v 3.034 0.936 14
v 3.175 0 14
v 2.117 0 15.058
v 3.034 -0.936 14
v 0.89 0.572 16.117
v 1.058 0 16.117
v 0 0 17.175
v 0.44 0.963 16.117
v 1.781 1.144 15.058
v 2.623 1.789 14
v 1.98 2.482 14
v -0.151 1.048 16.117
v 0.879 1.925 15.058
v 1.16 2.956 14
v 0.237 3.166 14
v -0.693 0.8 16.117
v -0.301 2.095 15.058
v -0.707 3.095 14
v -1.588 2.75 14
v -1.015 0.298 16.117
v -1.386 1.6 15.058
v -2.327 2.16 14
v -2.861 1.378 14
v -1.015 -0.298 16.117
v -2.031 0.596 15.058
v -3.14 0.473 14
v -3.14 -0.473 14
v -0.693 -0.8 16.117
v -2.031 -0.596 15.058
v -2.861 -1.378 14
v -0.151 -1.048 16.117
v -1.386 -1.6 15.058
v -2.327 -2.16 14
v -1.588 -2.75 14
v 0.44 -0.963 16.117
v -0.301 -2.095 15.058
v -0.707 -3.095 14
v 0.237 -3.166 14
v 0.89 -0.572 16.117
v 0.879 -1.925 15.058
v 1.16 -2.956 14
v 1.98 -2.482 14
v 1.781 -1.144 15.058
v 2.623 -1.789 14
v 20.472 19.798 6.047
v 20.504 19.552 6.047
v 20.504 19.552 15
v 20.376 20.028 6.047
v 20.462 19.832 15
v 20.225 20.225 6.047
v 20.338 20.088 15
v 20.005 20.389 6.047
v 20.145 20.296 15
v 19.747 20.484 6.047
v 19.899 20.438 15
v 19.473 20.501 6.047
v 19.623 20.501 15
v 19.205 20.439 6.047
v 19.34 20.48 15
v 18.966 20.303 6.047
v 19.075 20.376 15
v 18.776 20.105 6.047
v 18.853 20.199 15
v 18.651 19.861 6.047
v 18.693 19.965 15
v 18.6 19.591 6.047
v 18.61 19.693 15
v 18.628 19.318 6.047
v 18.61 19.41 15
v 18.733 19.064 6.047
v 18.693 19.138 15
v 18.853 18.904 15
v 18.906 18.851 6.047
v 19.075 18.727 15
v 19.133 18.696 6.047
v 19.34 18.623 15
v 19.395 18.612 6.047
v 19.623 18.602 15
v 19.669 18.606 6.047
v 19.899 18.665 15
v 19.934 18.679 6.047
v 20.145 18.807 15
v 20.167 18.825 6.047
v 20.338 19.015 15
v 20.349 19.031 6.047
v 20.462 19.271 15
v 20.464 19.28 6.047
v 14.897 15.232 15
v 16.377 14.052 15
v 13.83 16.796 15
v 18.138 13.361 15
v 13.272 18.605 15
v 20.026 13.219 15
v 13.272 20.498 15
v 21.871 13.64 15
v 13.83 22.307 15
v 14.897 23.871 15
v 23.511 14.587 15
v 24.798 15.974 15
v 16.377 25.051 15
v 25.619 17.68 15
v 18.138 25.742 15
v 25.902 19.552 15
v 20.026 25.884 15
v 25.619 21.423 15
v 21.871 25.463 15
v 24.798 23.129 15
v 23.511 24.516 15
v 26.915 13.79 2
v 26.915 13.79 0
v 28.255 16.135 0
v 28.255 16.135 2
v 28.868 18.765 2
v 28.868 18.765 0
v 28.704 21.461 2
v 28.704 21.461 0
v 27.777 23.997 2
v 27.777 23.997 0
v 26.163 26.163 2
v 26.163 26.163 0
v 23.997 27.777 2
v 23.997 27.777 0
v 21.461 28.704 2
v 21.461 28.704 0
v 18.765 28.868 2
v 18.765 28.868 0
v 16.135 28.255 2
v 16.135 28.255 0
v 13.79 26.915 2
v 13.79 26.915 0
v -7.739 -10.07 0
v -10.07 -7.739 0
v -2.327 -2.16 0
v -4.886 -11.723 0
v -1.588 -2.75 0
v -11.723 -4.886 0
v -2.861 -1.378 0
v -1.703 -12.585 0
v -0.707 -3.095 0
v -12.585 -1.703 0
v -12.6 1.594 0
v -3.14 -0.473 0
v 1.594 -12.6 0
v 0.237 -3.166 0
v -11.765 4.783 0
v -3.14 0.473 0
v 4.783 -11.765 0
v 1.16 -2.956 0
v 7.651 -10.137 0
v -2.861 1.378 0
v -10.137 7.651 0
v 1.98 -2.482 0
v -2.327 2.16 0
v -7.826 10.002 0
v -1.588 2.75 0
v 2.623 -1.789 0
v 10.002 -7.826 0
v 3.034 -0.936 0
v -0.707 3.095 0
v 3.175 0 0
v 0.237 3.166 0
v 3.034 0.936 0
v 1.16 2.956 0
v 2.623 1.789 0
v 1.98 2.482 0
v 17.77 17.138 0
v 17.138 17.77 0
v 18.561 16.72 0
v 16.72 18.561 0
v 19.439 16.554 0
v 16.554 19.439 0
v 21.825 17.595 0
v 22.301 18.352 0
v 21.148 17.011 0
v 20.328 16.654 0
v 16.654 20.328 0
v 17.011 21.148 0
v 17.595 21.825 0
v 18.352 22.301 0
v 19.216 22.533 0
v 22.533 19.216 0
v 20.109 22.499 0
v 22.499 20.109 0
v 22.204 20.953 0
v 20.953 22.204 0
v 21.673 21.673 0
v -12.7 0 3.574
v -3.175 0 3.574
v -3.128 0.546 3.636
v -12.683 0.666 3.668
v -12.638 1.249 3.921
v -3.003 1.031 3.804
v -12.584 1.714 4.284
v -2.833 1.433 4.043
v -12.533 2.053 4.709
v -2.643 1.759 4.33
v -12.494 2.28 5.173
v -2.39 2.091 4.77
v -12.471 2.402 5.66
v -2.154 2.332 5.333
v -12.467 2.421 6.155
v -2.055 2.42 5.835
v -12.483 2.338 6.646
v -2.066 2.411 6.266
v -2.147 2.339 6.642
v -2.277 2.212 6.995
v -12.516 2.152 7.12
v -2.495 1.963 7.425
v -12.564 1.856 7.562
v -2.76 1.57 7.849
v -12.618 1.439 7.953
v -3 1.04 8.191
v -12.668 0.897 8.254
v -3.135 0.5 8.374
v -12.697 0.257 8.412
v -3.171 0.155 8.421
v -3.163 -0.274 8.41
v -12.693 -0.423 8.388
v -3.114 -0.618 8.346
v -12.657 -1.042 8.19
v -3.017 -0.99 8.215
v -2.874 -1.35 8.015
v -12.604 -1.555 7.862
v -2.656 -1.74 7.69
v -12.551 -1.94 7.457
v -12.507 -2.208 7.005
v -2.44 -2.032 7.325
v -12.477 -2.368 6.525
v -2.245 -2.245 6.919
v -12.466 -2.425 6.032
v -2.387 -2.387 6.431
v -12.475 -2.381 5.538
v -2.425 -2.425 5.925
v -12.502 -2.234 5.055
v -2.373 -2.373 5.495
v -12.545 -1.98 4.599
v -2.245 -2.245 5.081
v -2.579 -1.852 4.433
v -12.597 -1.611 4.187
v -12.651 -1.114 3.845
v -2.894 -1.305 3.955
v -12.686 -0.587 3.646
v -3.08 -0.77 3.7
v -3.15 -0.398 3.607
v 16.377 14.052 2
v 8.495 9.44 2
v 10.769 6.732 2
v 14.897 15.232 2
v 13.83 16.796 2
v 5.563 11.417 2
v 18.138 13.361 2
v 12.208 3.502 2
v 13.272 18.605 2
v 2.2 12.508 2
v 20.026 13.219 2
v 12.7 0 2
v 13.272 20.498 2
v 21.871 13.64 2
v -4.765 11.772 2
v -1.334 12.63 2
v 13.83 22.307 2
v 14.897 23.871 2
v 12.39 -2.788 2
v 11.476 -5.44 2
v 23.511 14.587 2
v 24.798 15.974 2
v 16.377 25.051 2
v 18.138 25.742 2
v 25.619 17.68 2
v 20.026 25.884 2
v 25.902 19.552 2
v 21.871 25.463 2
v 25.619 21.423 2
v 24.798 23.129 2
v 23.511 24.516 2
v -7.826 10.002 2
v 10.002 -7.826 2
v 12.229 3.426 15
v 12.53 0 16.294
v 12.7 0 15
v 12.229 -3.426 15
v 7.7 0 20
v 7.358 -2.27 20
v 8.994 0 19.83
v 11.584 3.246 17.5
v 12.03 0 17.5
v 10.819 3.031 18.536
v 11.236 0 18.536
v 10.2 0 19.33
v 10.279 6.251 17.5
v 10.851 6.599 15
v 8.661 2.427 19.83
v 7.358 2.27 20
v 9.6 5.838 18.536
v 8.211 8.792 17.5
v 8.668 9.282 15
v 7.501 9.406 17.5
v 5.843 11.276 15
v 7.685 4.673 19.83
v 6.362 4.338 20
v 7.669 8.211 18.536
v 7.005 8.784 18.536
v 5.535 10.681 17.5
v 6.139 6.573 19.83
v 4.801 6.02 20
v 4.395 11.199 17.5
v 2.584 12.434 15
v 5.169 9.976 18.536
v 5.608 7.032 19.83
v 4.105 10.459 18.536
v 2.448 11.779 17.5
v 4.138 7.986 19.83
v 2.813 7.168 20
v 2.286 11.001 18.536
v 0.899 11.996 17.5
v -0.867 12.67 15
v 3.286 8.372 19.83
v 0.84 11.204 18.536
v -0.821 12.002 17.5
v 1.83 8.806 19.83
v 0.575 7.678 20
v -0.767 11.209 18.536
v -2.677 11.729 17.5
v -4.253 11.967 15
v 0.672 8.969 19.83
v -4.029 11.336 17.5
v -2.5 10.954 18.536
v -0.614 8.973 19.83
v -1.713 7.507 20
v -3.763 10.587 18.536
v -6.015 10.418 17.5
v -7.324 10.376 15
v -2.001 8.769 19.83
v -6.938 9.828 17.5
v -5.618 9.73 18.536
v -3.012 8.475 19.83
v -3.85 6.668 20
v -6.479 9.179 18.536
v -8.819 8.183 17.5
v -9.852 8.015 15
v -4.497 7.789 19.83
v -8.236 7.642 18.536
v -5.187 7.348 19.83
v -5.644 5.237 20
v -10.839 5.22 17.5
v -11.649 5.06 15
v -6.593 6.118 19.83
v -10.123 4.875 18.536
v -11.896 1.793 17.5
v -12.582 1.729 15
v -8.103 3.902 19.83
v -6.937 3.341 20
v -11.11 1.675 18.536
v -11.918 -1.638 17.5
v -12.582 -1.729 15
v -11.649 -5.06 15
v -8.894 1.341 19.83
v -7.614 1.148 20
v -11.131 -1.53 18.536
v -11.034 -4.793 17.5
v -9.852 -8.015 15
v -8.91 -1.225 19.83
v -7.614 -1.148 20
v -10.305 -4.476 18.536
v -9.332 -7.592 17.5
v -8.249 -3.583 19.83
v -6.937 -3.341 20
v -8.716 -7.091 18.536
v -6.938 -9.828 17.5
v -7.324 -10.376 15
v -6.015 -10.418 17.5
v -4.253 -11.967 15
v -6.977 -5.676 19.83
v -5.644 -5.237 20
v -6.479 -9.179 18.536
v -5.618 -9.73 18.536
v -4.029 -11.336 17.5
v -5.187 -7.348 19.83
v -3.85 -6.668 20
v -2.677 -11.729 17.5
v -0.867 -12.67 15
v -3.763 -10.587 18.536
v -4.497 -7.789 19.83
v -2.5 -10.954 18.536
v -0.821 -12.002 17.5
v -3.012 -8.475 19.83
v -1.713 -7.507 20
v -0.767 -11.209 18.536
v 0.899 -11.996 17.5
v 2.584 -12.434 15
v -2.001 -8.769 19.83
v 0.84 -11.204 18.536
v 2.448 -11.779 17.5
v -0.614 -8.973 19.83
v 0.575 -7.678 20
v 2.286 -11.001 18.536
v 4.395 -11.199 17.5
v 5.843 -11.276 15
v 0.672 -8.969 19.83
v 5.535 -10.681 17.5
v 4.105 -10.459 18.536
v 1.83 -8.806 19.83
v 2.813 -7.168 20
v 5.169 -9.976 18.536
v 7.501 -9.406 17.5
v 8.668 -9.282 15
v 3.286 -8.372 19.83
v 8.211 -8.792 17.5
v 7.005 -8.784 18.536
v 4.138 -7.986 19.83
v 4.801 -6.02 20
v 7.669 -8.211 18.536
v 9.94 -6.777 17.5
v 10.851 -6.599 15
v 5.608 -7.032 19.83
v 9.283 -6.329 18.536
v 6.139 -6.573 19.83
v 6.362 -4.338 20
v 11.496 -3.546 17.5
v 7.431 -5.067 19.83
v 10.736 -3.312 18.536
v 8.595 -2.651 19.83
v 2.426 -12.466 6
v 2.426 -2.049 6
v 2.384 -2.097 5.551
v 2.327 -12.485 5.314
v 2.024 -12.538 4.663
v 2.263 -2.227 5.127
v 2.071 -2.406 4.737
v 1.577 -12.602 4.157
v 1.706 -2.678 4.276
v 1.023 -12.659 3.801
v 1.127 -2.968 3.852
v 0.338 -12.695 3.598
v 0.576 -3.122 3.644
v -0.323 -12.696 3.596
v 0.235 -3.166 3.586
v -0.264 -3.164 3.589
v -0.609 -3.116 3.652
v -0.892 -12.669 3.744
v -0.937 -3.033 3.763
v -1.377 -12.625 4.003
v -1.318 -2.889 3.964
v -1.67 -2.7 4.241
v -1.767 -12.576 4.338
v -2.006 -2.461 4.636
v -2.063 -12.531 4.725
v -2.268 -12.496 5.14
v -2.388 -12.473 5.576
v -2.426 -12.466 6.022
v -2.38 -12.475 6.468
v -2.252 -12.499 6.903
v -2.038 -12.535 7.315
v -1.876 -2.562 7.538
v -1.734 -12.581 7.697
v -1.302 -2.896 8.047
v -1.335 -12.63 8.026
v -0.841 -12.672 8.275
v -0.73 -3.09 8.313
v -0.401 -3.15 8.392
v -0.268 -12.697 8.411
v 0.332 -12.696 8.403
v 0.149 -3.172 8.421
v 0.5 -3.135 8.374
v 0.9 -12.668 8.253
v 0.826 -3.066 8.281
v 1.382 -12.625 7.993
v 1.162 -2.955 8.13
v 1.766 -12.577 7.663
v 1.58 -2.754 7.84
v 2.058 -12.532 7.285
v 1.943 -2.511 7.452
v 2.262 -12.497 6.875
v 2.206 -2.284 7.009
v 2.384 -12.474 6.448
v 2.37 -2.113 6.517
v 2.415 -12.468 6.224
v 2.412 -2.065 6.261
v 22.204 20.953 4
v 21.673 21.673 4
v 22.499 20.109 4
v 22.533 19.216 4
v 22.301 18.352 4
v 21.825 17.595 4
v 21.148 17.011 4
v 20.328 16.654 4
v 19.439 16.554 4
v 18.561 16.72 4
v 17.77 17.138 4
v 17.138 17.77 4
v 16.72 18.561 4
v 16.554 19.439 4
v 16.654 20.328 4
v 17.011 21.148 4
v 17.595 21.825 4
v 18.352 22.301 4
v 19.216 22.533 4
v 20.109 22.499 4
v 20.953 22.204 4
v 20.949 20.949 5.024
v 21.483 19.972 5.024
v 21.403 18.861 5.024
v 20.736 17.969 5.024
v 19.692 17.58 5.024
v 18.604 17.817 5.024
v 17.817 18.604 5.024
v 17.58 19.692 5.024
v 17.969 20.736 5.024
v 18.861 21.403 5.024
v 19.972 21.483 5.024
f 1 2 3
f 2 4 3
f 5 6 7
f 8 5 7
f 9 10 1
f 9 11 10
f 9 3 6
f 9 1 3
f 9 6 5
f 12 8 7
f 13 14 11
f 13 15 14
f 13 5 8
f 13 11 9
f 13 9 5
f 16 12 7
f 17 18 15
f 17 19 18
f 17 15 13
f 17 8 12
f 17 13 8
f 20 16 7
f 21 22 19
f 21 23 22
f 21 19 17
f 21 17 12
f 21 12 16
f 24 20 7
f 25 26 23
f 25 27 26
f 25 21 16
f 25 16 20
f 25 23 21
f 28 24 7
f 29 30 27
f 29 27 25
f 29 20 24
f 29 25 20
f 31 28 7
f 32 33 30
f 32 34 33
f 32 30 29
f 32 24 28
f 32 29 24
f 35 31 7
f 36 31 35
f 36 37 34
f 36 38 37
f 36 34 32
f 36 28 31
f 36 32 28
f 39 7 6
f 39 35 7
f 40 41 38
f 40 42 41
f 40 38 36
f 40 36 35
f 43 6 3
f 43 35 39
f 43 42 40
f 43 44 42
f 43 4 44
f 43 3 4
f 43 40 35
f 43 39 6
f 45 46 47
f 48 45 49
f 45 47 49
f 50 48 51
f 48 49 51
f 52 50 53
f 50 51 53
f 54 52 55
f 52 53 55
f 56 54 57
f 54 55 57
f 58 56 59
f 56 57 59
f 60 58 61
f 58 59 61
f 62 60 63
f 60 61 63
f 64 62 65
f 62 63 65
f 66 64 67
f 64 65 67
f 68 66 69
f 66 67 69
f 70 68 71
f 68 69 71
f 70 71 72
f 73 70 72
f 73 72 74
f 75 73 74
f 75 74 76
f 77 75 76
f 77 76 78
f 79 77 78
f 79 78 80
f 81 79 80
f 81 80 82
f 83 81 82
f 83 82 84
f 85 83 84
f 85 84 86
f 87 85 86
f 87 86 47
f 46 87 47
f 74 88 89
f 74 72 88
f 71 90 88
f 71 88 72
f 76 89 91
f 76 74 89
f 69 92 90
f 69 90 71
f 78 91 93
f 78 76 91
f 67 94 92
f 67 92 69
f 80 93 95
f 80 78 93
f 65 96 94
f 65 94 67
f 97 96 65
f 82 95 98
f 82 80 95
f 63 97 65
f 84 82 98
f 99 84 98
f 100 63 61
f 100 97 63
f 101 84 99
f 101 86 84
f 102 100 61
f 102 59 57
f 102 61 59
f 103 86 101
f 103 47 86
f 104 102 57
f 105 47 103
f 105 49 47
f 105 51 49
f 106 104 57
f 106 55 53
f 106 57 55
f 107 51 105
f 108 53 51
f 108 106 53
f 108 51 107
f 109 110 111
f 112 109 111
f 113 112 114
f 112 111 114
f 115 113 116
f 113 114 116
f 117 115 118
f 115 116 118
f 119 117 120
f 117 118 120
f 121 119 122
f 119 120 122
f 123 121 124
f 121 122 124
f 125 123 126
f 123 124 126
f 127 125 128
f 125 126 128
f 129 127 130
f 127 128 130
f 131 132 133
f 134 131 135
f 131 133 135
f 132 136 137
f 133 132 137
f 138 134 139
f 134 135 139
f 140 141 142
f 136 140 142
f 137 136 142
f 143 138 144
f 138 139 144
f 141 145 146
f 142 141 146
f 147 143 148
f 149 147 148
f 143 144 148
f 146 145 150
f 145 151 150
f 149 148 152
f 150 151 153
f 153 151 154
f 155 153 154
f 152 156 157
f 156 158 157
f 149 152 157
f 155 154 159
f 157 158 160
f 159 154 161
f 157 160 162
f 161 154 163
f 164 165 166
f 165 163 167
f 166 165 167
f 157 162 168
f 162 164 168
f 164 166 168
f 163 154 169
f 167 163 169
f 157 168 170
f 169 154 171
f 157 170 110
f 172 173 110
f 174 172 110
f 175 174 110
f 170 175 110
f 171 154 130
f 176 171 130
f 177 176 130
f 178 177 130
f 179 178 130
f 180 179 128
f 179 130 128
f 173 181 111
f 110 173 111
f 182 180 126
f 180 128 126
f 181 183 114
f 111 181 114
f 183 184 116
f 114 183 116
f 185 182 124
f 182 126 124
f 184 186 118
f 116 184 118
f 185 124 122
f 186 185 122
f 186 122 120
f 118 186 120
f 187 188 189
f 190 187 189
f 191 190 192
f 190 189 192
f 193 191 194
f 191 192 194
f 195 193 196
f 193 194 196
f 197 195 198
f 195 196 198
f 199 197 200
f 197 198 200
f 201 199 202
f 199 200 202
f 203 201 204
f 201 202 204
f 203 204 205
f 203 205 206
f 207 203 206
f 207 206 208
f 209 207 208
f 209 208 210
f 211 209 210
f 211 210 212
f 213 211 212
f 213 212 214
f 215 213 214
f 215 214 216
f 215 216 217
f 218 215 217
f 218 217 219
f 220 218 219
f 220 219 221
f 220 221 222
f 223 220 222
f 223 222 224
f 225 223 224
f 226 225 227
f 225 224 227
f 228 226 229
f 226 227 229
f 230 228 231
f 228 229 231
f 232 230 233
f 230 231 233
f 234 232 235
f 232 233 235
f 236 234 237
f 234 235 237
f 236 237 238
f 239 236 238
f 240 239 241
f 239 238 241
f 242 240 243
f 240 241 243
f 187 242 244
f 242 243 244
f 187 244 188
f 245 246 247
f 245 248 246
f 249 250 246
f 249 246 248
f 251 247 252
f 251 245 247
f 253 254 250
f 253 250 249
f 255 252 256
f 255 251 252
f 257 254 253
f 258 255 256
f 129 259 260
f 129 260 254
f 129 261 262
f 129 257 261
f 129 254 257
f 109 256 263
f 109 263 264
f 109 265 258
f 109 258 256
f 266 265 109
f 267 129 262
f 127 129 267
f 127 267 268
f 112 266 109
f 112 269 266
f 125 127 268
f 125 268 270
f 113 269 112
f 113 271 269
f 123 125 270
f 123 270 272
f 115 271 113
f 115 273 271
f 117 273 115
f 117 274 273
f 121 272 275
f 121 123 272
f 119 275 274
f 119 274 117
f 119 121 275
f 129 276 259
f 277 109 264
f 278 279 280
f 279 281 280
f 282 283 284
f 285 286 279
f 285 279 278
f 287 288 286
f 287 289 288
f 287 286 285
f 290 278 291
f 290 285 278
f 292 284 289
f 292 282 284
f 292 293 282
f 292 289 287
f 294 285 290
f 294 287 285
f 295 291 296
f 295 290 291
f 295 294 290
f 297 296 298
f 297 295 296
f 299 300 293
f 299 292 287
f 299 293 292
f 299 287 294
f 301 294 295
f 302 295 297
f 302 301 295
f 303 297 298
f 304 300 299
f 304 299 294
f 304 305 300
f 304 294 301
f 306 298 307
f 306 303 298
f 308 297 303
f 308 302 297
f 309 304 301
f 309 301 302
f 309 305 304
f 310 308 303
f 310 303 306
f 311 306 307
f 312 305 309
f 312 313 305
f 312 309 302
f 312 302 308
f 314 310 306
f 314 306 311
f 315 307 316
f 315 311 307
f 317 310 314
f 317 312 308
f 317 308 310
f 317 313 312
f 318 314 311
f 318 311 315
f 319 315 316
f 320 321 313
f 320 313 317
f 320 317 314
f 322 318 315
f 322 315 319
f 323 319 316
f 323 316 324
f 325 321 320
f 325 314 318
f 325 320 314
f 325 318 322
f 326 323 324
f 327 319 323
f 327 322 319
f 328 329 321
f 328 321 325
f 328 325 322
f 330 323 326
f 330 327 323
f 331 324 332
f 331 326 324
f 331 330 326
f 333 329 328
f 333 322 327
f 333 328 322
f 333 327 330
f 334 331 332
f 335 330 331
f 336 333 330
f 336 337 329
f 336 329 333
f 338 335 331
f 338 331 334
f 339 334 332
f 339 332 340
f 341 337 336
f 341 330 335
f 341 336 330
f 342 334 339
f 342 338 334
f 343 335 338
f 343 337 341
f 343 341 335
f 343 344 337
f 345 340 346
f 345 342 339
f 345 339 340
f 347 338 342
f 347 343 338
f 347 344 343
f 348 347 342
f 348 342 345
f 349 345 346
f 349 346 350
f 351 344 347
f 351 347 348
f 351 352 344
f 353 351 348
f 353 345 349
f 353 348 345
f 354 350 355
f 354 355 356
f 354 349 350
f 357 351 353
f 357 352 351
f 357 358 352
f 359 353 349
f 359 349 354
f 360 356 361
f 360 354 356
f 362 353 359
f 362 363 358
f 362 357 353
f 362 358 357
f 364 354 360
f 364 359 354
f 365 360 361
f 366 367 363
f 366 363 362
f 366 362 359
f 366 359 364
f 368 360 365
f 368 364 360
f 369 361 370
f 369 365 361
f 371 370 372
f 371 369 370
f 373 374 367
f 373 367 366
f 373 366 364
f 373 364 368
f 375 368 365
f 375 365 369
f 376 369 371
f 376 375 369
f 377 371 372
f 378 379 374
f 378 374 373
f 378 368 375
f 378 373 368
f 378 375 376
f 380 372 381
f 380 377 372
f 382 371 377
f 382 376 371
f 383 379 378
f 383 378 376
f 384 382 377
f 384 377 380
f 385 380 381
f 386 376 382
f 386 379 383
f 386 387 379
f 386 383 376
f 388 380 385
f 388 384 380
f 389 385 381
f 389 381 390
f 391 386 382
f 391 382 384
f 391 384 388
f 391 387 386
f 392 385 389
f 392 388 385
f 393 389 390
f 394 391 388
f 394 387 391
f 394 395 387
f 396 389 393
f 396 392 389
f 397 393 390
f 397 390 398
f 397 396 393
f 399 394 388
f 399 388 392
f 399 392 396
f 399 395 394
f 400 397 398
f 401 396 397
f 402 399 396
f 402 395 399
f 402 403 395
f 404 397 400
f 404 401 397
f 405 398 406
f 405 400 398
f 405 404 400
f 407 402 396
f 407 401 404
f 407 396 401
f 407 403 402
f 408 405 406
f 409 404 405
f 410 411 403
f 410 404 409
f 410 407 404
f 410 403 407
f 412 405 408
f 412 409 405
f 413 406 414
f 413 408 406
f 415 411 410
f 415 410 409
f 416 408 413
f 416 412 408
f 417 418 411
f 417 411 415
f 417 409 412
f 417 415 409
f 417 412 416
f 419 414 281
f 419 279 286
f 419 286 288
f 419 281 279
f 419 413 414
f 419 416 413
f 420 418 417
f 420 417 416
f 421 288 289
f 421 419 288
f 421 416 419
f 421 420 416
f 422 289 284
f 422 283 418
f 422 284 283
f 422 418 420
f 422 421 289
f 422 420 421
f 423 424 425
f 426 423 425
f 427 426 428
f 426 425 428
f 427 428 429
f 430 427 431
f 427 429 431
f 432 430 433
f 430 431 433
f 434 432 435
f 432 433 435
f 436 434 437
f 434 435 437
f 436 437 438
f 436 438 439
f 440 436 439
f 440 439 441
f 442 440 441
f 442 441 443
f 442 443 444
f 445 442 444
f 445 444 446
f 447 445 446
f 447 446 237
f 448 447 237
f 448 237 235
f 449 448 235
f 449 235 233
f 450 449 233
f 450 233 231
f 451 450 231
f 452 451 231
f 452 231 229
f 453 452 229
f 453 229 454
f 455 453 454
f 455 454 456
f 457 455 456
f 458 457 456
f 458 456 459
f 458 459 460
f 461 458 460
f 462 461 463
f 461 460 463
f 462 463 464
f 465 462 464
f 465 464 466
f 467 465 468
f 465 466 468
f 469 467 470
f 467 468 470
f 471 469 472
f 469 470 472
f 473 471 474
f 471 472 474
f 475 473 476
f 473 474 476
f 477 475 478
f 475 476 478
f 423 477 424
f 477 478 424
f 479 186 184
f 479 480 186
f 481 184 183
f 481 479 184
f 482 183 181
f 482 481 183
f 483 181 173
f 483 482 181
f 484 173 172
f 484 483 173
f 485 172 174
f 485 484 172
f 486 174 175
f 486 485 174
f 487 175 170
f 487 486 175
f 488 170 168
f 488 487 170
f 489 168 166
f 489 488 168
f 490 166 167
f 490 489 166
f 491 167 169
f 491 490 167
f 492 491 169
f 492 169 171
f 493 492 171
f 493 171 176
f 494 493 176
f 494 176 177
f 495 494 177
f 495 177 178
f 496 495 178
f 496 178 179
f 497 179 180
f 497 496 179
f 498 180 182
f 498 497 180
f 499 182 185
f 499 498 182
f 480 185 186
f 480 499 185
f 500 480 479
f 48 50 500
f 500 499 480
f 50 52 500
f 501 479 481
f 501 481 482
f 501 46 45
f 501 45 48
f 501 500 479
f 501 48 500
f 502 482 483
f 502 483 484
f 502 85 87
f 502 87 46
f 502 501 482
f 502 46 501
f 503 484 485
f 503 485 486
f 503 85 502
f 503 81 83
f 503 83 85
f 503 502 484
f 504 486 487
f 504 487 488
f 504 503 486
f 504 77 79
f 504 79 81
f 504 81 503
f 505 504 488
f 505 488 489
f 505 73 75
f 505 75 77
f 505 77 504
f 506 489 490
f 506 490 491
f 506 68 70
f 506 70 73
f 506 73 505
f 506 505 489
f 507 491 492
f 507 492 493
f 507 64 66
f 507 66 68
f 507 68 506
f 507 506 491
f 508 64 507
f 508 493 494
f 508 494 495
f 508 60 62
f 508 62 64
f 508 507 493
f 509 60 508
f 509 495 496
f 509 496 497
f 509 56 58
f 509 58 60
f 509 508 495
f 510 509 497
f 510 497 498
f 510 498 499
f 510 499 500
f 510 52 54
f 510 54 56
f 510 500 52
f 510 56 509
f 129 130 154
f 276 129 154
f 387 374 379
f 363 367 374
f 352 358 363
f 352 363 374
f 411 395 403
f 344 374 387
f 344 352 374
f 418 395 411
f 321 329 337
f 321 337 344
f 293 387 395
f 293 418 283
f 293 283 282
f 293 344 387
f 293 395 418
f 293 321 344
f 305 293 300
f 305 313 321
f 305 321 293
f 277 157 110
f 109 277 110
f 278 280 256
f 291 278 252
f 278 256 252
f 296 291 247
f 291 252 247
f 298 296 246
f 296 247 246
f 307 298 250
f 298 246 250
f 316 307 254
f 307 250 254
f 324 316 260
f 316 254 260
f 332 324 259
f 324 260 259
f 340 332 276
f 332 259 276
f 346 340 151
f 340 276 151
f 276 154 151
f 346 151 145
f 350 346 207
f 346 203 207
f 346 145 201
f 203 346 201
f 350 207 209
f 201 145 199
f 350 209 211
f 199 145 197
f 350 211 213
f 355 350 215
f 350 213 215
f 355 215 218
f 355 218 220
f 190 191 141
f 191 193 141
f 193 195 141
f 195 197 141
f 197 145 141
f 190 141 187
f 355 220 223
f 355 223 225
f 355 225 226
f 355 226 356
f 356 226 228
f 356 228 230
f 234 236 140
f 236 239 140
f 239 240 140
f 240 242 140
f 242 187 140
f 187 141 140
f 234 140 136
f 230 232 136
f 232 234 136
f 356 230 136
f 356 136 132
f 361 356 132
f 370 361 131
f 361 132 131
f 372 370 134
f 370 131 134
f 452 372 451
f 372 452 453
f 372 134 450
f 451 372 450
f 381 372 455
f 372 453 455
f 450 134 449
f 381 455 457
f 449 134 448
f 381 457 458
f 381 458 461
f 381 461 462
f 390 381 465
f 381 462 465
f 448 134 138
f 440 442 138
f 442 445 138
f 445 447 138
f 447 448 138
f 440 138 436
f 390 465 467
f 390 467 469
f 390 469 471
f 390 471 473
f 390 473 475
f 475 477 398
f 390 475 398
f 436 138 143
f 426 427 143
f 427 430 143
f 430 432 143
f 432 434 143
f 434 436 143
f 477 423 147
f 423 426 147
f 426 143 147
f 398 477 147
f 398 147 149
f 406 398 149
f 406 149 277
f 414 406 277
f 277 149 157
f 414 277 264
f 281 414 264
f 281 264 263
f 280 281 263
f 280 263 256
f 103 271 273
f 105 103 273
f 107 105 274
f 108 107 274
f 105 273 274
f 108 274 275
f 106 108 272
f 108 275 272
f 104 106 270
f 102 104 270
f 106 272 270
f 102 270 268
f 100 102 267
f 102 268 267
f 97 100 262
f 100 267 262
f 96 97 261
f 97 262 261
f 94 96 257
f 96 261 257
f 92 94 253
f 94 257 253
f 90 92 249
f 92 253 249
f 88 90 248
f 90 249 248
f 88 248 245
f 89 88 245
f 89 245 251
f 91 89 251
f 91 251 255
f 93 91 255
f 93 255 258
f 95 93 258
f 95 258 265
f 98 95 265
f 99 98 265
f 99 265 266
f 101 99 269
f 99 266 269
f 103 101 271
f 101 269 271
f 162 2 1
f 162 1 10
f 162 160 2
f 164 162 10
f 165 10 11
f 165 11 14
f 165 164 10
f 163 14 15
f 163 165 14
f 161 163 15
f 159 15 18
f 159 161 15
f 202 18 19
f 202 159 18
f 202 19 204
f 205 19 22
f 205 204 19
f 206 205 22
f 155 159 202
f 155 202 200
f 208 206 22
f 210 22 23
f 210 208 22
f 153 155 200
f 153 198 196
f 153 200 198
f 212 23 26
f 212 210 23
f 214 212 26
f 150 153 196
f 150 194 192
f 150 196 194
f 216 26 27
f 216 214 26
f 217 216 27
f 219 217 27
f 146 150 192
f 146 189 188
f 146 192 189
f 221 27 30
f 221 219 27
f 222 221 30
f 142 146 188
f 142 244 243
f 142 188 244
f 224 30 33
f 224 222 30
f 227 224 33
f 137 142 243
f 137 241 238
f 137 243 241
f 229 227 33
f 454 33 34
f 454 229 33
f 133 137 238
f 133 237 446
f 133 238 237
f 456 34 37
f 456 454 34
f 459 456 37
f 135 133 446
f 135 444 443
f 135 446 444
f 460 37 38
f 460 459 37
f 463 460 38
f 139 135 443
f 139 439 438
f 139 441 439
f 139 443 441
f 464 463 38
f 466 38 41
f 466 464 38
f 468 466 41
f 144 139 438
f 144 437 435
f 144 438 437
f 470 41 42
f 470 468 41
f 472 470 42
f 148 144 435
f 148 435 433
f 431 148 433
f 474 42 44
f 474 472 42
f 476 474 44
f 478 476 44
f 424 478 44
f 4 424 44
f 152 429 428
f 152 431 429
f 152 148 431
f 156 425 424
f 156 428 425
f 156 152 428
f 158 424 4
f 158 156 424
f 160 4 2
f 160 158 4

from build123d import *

# Parameters (mm, degrees)
SKETCH1_R           = 12.7
BOSS_EXTRUDE1_DEPTH = 20
FILLET1_R           = 5
CUT_EXTRUDE1_REACH  = 14.7
SKETCH3_R           = 2.4257
CUT_EXTRUDE2_REACH  = 14.7
SKETCH4_R           = 2.4257
BOSS_EXTRUDE2_DEPTH = 2
SKETCH6_R           = 6.35
BOSS_EXTRUDE3_DEPTH = 13
SKETCH8_R           = 0.9525
CUT_EXTRUDE3_DEPTH  = 16.0000001


with BuildPart() as part:
    # Sketch1 → Boss-Extrude1 (new body)
    with BuildSketch(Plane.XY):
        Circle(SKETCH1_R)
    extrude(amount=BOSS_EXTRUDE1_DEPTH)

    # Sketch2 → Cut-Revolve1 (revolve, cut)
    with BuildSketch(Plane(origin=(0, 0, 0), x_dir=(1, 0, 0), z_dir=(0, 1, 0))):
        Polygon((0, 0), (0, -17.175), (3.175, -14), (3.175, 0), align=None)
    revolve(axis=Axis((0, 0, -1), (0, 0, 1)), mode=Mode.SUBTRACT)

    # Fillet1
    fillet1_edges = [part.edges().sort_by_distance(p)[0] for p in [
        (-12.7, 0, 20),
    ]]
    fillet(fillet1_edges, radius=FILLET1_R)

    # Sketch3 → Cut-Extrude1 (cut, up to next)
    with BuildSketch(Plane(origin=(0, 0, 0), x_dir=(1, 0, 0), z_dir=(0, 1, 0)), mode=Mode.PRIVATE) as cut_extrude1_sk1:
        with Locations((0, -6)):
            Circle(SKETCH3_R)
    cut_extrude1_tool1 = extrude(cut_extrude1_sk1.sketch, amount=-CUT_EXTRUDE1_REACH, mode=Mode.PRIVATE) & part.part
    add(cut_extrude1_tool1.solids().sort_by_distance((0, 0, 6))[0], mode=Mode.SUBTRACT)

    # Sketch4 → Cut-Extrude2 (cut, up to next)
    with BuildSketch(Plane(origin=(0, 0, 0), x_dir=(0, 0, -1), z_dir=(1, 0, 0)), mode=Mode.PRIVATE) as cut_extrude2_sk1:
        with Locations((-6, 0)):
            Circle(SKETCH4_R)
    cut_extrude2_tool1 = extrude(cut_extrude2_sk1.sketch, amount=-CUT_EXTRUDE2_REACH, mode=Mode.PRIVATE) & part.part
    add(cut_extrude2_tool1.solids().sort_by_distance((0, 0, 6))[0], mode=Mode.SUBTRACT)

    # Sketch5 → Boss-Extrude2 (add)
    with BuildSketch(Plane.XY):
        with BuildLine():
            Line((13.789783932, 26.915271857), (-7.826077627, 10.002125223))
            ThreePointArc((-7.826077627, 10.002125223), (8.980256121, 8.980256121), (10.002125223, -7.826077627))
            Line((10.002125223, -7.826077627), (26.915271857, 13.789783932))
            ThreePointArc((26.915271857, 13.789783932), (26.162950904, 26.162950904), (13.789783932, 26.915271857))
        make_face()
    extrude(amount=BOSS_EXTRUDE2_DEPTH)

    # Sketch6 → Boss-Extrude3 (add)
    with BuildSketch(Plane.XY.offset(2)):
        with Locations((19.5515025, 19.5515025)):
            Circle(SKETCH6_R)
    extrude(amount=BOSS_EXTRUDE3_DEPTH)

    # Sketch7 → Cut-Revolve2 (revolve, cut)
    with BuildSketch(Plane(origin=(0, 0, 0), x_dir=(0, 0, 1), z_dir=(-0.707106781, 0.707106781, 0))):
        Polygon((0, 30.65), (4, 30.65), (7, 27.65), (0, 27.65), align=None)
    revolve(axis=Axis((19.5515025, 19.5515025, 15), (0, 0, -1)), mode=Mode.SUBTRACT)

    # Sketch8 → Cut-Extrude3 (cut, through all)
    with BuildSketch(Plane.XY.offset(15)):
        with Locations((19.5515025, 19.5515025)):
            Circle(SKETCH8_R)
    extrude(amount=-CUT_EXTRUDE3_DEPTH, mode=Mode.SUBTRACT)


solid = part.part
